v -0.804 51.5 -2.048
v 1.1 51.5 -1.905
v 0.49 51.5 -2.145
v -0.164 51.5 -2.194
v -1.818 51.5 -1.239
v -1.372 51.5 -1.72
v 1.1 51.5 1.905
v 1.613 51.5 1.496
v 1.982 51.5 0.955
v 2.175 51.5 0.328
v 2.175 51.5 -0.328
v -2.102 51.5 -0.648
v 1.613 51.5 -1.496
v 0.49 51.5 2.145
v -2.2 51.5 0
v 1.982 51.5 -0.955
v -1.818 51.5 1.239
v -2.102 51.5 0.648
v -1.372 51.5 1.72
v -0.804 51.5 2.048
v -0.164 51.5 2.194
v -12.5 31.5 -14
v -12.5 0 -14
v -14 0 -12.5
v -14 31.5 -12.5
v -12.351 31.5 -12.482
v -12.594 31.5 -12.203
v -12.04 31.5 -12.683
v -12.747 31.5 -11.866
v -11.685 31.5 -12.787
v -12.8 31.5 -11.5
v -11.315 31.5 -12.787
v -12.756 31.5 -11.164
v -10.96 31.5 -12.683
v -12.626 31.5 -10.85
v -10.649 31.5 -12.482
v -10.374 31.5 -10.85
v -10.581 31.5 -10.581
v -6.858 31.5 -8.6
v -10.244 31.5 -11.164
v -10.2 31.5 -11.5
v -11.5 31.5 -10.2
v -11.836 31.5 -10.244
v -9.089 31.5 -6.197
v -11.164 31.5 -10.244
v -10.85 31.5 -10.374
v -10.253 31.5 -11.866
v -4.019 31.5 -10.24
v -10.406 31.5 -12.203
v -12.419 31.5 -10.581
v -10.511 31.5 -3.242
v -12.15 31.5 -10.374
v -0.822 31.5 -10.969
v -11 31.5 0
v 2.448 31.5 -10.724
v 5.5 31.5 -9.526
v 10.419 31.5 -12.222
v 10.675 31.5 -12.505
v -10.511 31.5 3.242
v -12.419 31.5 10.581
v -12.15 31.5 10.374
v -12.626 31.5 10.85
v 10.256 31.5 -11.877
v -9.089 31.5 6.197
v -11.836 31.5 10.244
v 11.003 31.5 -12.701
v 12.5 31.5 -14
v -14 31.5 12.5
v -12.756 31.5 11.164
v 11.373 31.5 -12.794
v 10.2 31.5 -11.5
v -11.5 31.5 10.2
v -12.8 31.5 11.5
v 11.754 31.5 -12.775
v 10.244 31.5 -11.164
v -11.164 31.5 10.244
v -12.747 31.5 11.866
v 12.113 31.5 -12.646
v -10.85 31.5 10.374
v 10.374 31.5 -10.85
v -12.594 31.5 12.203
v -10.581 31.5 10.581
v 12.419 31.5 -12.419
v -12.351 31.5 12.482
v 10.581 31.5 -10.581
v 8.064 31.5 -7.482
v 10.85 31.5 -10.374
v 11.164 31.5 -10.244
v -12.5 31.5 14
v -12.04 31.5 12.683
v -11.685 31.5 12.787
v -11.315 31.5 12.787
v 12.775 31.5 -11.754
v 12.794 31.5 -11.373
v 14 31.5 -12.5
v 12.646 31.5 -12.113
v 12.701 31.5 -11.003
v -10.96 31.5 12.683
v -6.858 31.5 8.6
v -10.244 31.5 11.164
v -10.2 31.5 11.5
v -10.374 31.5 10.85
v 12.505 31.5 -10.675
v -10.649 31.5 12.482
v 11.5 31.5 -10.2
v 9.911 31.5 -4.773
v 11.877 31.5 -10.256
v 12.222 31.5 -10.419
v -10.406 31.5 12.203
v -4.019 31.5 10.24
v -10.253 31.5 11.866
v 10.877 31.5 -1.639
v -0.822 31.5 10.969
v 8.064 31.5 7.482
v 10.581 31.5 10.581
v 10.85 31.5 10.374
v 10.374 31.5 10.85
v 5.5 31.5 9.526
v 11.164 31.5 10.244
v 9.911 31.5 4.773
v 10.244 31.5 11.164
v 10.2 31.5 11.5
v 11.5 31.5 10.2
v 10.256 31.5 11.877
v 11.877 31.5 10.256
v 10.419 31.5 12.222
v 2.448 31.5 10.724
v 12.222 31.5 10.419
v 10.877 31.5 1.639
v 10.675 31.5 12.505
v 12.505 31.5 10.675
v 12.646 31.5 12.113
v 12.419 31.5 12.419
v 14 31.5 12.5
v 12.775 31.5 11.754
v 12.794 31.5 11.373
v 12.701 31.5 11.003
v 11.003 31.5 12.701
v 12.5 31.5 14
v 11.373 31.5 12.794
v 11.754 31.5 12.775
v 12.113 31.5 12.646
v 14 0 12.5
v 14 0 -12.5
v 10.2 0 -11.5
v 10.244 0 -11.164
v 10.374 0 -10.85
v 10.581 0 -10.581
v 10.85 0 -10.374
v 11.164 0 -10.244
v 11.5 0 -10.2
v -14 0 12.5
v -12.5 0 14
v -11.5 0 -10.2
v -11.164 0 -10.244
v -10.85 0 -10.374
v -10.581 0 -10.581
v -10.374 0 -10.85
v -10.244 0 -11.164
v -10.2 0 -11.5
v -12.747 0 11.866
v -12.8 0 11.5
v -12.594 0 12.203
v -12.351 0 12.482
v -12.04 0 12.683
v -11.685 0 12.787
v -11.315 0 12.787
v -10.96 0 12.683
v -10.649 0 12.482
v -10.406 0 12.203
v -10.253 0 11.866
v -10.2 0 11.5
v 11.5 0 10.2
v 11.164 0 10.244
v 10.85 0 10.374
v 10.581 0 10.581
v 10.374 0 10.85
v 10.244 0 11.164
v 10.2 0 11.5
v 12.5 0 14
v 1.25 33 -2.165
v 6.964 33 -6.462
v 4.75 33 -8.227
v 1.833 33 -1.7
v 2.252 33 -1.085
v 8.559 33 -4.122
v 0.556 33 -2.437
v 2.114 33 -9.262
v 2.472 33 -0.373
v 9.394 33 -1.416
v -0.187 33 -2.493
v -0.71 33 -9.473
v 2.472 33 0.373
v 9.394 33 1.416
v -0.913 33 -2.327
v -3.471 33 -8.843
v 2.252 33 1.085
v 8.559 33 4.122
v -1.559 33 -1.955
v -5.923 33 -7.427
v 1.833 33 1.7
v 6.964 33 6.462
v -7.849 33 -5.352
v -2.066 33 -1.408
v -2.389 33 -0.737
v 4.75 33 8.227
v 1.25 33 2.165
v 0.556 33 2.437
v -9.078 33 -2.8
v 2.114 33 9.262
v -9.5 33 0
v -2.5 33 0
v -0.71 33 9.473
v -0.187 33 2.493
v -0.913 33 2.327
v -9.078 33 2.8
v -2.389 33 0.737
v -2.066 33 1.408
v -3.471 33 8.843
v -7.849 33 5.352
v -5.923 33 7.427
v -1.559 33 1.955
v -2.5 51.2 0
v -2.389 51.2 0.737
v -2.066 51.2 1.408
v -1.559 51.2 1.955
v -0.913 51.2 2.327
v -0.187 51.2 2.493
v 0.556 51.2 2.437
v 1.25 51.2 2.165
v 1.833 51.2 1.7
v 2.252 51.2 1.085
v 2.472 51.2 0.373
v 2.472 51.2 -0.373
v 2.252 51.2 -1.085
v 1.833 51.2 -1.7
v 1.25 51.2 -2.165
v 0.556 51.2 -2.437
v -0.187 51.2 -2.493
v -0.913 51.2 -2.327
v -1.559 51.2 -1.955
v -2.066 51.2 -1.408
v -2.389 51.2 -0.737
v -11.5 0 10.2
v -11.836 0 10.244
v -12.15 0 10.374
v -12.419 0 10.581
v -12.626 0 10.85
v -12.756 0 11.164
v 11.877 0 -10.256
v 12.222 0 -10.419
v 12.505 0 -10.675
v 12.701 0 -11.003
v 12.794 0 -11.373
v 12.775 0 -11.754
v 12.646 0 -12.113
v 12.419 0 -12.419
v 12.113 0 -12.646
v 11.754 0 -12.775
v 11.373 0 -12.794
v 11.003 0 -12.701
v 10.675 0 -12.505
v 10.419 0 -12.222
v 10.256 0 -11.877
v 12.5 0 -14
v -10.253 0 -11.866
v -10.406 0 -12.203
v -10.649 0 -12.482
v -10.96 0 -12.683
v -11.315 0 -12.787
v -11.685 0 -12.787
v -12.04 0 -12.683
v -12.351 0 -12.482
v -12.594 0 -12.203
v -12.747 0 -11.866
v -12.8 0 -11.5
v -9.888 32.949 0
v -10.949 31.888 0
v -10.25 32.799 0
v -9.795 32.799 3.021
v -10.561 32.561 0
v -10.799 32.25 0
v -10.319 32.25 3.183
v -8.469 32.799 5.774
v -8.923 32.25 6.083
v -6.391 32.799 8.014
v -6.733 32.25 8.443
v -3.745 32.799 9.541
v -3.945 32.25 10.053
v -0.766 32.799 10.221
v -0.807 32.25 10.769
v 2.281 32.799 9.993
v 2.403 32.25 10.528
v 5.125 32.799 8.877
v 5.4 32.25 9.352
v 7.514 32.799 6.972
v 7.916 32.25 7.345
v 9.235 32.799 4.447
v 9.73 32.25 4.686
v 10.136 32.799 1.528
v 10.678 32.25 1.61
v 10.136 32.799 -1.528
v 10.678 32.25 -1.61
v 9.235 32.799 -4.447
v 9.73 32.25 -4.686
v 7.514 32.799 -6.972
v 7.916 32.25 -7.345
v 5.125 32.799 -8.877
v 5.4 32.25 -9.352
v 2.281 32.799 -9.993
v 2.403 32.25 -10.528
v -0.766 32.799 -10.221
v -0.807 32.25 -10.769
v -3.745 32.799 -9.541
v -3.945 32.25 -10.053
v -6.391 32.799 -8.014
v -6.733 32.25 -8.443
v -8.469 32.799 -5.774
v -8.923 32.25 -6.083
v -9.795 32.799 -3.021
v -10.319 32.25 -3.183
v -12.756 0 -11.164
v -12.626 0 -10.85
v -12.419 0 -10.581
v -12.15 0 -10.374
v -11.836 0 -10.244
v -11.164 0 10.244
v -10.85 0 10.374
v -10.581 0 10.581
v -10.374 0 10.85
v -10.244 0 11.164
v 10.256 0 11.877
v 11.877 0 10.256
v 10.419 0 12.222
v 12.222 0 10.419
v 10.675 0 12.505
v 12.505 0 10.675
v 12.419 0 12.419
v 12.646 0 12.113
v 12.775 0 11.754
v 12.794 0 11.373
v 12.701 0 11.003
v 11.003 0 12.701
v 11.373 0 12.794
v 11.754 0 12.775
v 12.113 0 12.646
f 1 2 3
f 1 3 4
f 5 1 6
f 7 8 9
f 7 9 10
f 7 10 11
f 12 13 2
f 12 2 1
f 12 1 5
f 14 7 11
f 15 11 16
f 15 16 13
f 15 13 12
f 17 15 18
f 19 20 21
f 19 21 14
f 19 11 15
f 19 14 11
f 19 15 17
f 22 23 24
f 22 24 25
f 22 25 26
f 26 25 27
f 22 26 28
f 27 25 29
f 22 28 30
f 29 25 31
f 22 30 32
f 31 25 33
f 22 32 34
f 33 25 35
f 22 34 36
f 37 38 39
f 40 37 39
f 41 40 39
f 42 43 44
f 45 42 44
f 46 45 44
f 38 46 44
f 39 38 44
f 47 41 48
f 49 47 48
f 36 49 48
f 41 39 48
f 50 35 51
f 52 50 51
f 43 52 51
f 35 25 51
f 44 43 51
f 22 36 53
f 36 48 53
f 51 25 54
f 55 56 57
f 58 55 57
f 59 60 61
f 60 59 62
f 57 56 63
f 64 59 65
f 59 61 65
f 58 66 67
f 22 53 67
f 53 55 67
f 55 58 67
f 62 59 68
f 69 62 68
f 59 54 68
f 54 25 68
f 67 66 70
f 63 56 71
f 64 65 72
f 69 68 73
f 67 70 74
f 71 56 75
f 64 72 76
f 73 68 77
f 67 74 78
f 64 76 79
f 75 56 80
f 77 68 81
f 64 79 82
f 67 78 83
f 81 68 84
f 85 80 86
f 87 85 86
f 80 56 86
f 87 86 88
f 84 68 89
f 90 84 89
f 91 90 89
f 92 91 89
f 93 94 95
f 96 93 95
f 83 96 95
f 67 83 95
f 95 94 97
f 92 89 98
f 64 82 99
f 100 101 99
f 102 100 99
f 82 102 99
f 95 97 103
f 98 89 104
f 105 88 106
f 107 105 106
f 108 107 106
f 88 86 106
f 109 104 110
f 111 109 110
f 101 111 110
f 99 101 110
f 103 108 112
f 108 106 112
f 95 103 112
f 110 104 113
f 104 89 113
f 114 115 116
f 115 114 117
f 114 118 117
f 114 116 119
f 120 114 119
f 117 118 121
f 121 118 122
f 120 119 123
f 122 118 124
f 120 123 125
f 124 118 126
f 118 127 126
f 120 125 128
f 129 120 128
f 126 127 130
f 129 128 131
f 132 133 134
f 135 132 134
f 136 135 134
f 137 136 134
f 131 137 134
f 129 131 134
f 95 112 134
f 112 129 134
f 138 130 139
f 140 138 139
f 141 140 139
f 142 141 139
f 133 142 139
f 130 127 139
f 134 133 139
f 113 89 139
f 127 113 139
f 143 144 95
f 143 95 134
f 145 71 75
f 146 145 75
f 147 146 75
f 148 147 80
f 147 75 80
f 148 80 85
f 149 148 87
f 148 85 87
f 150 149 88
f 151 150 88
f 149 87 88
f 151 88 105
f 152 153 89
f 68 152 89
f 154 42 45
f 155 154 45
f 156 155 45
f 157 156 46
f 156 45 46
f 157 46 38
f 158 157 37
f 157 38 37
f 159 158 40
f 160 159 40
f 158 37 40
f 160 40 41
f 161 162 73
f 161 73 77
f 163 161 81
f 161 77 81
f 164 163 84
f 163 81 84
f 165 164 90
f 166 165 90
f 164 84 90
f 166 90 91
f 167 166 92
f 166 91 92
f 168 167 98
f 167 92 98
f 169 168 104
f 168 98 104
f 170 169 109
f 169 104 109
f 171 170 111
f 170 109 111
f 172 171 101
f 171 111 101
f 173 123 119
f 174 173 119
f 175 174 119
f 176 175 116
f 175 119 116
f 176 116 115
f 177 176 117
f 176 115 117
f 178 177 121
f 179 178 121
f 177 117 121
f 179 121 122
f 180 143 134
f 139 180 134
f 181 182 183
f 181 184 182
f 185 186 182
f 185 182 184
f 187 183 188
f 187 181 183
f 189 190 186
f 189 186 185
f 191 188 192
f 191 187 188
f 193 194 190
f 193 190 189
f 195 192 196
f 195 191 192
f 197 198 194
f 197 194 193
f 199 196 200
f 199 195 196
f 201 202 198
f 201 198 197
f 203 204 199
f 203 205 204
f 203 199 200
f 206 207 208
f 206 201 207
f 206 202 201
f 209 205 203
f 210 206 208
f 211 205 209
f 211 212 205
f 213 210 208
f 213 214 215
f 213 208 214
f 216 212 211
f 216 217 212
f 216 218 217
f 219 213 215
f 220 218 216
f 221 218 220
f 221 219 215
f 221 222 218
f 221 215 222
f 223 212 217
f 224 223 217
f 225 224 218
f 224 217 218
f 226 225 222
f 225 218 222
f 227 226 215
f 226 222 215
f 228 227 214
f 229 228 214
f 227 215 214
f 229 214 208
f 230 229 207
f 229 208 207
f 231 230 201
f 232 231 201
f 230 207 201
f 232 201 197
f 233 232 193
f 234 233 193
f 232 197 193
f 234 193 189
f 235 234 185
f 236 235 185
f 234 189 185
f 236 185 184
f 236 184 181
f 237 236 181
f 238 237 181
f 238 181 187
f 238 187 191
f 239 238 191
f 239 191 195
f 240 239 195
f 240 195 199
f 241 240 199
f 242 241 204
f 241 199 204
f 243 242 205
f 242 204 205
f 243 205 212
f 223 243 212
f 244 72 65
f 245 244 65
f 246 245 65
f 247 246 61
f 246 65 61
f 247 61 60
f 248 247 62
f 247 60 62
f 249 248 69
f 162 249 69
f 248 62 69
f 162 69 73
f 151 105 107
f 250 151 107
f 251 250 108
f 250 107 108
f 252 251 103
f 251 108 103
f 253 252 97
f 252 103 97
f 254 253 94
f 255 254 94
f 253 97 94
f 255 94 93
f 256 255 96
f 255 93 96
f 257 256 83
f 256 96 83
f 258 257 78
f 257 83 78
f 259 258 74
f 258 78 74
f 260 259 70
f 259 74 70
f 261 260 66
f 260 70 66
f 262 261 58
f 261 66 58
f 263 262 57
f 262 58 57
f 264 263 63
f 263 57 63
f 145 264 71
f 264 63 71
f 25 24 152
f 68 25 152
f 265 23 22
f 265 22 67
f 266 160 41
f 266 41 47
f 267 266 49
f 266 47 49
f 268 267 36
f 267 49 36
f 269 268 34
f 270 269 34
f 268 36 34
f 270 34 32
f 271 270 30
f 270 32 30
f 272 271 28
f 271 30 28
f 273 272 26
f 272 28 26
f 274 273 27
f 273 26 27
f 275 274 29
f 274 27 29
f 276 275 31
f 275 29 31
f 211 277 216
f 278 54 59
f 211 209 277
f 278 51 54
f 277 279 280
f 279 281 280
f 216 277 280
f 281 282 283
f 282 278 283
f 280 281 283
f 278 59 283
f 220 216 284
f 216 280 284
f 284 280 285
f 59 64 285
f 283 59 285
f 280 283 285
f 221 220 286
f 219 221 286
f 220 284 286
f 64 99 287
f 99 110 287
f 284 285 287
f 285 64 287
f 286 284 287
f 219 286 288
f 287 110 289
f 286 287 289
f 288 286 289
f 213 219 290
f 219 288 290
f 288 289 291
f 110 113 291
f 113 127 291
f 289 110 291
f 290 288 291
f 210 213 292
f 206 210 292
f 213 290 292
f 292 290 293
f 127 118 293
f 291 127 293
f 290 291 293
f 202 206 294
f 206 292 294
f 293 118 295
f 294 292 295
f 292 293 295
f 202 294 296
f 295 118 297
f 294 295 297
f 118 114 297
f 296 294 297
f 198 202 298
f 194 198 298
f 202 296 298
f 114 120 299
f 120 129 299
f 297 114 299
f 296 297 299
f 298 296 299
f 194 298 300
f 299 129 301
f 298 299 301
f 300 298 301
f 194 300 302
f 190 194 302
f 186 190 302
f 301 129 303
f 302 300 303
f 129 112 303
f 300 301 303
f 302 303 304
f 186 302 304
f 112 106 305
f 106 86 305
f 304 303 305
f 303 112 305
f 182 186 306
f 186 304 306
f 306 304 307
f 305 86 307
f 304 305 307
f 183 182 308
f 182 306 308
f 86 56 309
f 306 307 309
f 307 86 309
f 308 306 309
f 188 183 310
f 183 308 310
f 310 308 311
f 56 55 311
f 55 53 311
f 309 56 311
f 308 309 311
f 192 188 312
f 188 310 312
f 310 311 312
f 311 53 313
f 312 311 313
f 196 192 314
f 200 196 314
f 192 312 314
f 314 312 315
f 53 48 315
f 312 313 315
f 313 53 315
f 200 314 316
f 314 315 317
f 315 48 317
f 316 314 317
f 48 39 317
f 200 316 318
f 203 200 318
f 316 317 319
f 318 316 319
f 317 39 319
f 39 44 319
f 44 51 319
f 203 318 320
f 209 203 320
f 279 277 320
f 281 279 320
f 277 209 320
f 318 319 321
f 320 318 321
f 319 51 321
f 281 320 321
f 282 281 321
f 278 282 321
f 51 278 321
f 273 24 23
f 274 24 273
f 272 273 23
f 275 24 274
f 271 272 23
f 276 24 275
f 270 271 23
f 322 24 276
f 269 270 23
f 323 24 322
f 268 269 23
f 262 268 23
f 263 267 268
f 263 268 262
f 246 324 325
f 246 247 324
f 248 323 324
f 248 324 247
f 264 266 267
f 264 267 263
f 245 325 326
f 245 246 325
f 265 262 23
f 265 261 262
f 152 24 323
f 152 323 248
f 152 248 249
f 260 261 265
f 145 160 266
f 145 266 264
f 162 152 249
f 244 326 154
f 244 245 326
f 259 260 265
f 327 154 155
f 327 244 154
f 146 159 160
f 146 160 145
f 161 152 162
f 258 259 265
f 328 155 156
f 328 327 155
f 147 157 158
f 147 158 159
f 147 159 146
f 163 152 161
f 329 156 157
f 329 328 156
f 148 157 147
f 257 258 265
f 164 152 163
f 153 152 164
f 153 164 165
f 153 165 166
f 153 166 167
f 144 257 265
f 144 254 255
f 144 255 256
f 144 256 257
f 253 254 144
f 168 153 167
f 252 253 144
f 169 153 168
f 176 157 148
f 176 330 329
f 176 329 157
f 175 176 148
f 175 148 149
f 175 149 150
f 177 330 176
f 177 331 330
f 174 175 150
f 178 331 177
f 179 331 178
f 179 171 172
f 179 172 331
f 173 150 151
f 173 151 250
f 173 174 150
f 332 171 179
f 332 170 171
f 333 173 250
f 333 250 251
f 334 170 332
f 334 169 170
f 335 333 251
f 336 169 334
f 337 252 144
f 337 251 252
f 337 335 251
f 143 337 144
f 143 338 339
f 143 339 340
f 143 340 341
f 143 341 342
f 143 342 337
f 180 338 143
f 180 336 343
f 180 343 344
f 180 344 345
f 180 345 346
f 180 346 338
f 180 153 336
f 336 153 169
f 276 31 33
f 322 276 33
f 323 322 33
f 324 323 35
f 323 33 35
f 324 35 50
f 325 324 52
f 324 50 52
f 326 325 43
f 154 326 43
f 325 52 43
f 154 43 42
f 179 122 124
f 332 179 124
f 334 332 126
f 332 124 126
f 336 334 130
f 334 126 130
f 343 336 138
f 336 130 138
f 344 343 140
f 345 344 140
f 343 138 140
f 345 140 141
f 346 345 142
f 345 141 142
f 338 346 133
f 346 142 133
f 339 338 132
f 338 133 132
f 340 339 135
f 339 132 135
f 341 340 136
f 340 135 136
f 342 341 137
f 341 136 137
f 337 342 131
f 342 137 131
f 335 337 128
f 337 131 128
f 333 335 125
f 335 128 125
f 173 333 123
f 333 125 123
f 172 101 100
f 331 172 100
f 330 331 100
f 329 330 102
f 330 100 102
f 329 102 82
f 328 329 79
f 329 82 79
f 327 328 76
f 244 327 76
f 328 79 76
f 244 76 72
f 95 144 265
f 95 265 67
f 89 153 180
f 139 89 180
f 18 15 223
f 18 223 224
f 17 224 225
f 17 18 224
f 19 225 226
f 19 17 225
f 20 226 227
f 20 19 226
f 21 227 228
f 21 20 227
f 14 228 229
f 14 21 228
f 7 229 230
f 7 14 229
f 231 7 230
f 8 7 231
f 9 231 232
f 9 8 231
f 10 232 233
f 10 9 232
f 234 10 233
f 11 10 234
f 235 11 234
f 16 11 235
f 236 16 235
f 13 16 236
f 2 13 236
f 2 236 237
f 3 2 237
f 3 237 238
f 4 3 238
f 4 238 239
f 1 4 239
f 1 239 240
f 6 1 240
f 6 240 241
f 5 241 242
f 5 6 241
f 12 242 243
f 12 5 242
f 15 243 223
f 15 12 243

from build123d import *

# Parameters (mm, degrees)
F0_W      = 28
F0_H      = 28
F1_DEPTH  = 31.5
F2_R      = 11
F3_DEPTH  = 1.5
F4_R      = 2.5
F5_DEPTH  = 18.5
F6_SIZE   = 1.5
F7_SIZE   = 0.3
F8_R      = 1.49999
F10_DEPTH = 31.5


# Not quite as in the source:
# - a fillet or chamfer is up to 0.001 mm smaller than in the source, because OpenCascade refuses the exact size


with BuildPart() as f1:
    # F0 (on Front) → F1 (new body)
    with BuildSketch(Plane.XZ):
        Rectangle(F0_W, F0_H)
    extrude(amount=-F1_DEPTH)

    # F2 (on face) → F3 (join)
    with BuildSketch(Plane(origin=(0, 31.5, 0), x_dir=(-1, 0, 0), z_dir=(0, 1, 0))):
        Circle(F2_R)
    extrude(amount=F3_DEPTH)

    # F4 (on face) → F5 (join)
    with BuildSketch(Plane(origin=(0, 33, 0), x_dir=(-1, 0, 0), z_dir=(0, 1, 0))):
        Circle(F4_R)
    extrude(amount=F5_DEPTH)

    # F6
    f6_edges = [f1.edges().sort_by_distance(p)[0] for p in [
        (14, 15.75, 14),
        (14, 15.75, -14),
        (-14, 15.75, -14),
        (-14, 15.75, 14),
    ]]
    chamfer(f6_edges, length=F6_SIZE)

    # F7
    f7_edges = [f1.edges().sort_by_distance(p)[0] for p in [
        (2.5, 51.5, 0),
    ]]
    chamfer(f7_edges, length=F7_SIZE)

    # F8 (radius 1.5 in the source; OpenCascade refuses exactly that, so slightly less here)
    f8_edges = [f1.edges().sort_by_distance(p)[0] for p in [
        (11, 33, 0),
    ]]
    fillet(f8_edges, radius=F8_R)

    # F9 (on face) → F10 (cut)
    with BuildSketch(Plane(origin=(0, 31.5, 0), x_dir=(-1, 0, 0), z_dir=(0, 1, 0))):
        with BuildLine():
            Line((-11.5, -11.5), (-11.5, -10.2))
            ThreePointArc((-11.5, -10.2), (-12.4192388155, -12.4192388155), (-10.2, -11.5))
            Line((-10.2, -11.5), (-11.5, -11.5))
        make_face()
        with BuildLine():
            ThreePointArc((-10.2, -11.5), (-10.5807611845, -10.5807611845), (-11.5, -10.2))
            Line((-11.5, -10.2), (-11.5, -11.5))
            Line((-11.5, -11.5), (-10.2, -11.5))
        make_face()
        with BuildLine():
            ThreePointArc((12.8, -11.5), (12.4192388155, -10.5807611845), (11.5, -10.2))
            Line((11.5, -10.2), (11.5, -11.5))
            Line((11.5, -11.5), (10.2, -11.5))
            ThreePointArc((10.2, -11.5), (11.5, -12.8), (12.8, -11.5))
        make_face()
        with BuildLine():
            Line((11.5, -11.5), (11.5, -10.2))
            ThreePointArc((11.5, -10.2), (10.5807611845, -10.5807611845), (10.2, -11.5))
            Line((10.2, -11.5), (11.5, -11.5))
        make_face()
        with BuildLine():
            Line((11.5, 11.5), (10.2, 11.5))
            ThreePointArc((10.2, 11.5), (10.5807611845, 10.5807611845), (11.5, 10.2))
            Line((11.5, 10.2), (11.5, 11.5))
        make_face()
        with BuildLine():
            ThreePointArc((12.8, 11.5), (11.5, 12.8), (10.2, 11.5))
            Line((10.2, 11.5), (11.5, 11.5))
            Line((11.5, 11.5), (11.5, 10.2))
            ThreePointArc((11.5, 10.2), (12.4192388155, 10.5807611845), (12.8, 11.5))
        make_face()
        with BuildLine():
            ThreePointArc((-11.5, 10.2), (-10.5807611845, 10.5807611845), (-10.2, 11.5))
            Line((-10.2, 11.5), (-11.5, 11.5))
            Line((-11.5, 11.5), (-11.5, 10.2))
        make_face()
        with BuildLine():
            Line((-11.5, 11.5), (-10.2, 11.5))
            ThreePointArc((-10.2, 11.5), (-12.4192388155, 12.4192388155), (-11.5, 10.2))
            Line((-11.5, 10.2), (-11.5, 11.5))
        make_face()
    extrude(amount=-F10_DEPTH, mode=Mode.SUBTRACT)


solid = f1.part
